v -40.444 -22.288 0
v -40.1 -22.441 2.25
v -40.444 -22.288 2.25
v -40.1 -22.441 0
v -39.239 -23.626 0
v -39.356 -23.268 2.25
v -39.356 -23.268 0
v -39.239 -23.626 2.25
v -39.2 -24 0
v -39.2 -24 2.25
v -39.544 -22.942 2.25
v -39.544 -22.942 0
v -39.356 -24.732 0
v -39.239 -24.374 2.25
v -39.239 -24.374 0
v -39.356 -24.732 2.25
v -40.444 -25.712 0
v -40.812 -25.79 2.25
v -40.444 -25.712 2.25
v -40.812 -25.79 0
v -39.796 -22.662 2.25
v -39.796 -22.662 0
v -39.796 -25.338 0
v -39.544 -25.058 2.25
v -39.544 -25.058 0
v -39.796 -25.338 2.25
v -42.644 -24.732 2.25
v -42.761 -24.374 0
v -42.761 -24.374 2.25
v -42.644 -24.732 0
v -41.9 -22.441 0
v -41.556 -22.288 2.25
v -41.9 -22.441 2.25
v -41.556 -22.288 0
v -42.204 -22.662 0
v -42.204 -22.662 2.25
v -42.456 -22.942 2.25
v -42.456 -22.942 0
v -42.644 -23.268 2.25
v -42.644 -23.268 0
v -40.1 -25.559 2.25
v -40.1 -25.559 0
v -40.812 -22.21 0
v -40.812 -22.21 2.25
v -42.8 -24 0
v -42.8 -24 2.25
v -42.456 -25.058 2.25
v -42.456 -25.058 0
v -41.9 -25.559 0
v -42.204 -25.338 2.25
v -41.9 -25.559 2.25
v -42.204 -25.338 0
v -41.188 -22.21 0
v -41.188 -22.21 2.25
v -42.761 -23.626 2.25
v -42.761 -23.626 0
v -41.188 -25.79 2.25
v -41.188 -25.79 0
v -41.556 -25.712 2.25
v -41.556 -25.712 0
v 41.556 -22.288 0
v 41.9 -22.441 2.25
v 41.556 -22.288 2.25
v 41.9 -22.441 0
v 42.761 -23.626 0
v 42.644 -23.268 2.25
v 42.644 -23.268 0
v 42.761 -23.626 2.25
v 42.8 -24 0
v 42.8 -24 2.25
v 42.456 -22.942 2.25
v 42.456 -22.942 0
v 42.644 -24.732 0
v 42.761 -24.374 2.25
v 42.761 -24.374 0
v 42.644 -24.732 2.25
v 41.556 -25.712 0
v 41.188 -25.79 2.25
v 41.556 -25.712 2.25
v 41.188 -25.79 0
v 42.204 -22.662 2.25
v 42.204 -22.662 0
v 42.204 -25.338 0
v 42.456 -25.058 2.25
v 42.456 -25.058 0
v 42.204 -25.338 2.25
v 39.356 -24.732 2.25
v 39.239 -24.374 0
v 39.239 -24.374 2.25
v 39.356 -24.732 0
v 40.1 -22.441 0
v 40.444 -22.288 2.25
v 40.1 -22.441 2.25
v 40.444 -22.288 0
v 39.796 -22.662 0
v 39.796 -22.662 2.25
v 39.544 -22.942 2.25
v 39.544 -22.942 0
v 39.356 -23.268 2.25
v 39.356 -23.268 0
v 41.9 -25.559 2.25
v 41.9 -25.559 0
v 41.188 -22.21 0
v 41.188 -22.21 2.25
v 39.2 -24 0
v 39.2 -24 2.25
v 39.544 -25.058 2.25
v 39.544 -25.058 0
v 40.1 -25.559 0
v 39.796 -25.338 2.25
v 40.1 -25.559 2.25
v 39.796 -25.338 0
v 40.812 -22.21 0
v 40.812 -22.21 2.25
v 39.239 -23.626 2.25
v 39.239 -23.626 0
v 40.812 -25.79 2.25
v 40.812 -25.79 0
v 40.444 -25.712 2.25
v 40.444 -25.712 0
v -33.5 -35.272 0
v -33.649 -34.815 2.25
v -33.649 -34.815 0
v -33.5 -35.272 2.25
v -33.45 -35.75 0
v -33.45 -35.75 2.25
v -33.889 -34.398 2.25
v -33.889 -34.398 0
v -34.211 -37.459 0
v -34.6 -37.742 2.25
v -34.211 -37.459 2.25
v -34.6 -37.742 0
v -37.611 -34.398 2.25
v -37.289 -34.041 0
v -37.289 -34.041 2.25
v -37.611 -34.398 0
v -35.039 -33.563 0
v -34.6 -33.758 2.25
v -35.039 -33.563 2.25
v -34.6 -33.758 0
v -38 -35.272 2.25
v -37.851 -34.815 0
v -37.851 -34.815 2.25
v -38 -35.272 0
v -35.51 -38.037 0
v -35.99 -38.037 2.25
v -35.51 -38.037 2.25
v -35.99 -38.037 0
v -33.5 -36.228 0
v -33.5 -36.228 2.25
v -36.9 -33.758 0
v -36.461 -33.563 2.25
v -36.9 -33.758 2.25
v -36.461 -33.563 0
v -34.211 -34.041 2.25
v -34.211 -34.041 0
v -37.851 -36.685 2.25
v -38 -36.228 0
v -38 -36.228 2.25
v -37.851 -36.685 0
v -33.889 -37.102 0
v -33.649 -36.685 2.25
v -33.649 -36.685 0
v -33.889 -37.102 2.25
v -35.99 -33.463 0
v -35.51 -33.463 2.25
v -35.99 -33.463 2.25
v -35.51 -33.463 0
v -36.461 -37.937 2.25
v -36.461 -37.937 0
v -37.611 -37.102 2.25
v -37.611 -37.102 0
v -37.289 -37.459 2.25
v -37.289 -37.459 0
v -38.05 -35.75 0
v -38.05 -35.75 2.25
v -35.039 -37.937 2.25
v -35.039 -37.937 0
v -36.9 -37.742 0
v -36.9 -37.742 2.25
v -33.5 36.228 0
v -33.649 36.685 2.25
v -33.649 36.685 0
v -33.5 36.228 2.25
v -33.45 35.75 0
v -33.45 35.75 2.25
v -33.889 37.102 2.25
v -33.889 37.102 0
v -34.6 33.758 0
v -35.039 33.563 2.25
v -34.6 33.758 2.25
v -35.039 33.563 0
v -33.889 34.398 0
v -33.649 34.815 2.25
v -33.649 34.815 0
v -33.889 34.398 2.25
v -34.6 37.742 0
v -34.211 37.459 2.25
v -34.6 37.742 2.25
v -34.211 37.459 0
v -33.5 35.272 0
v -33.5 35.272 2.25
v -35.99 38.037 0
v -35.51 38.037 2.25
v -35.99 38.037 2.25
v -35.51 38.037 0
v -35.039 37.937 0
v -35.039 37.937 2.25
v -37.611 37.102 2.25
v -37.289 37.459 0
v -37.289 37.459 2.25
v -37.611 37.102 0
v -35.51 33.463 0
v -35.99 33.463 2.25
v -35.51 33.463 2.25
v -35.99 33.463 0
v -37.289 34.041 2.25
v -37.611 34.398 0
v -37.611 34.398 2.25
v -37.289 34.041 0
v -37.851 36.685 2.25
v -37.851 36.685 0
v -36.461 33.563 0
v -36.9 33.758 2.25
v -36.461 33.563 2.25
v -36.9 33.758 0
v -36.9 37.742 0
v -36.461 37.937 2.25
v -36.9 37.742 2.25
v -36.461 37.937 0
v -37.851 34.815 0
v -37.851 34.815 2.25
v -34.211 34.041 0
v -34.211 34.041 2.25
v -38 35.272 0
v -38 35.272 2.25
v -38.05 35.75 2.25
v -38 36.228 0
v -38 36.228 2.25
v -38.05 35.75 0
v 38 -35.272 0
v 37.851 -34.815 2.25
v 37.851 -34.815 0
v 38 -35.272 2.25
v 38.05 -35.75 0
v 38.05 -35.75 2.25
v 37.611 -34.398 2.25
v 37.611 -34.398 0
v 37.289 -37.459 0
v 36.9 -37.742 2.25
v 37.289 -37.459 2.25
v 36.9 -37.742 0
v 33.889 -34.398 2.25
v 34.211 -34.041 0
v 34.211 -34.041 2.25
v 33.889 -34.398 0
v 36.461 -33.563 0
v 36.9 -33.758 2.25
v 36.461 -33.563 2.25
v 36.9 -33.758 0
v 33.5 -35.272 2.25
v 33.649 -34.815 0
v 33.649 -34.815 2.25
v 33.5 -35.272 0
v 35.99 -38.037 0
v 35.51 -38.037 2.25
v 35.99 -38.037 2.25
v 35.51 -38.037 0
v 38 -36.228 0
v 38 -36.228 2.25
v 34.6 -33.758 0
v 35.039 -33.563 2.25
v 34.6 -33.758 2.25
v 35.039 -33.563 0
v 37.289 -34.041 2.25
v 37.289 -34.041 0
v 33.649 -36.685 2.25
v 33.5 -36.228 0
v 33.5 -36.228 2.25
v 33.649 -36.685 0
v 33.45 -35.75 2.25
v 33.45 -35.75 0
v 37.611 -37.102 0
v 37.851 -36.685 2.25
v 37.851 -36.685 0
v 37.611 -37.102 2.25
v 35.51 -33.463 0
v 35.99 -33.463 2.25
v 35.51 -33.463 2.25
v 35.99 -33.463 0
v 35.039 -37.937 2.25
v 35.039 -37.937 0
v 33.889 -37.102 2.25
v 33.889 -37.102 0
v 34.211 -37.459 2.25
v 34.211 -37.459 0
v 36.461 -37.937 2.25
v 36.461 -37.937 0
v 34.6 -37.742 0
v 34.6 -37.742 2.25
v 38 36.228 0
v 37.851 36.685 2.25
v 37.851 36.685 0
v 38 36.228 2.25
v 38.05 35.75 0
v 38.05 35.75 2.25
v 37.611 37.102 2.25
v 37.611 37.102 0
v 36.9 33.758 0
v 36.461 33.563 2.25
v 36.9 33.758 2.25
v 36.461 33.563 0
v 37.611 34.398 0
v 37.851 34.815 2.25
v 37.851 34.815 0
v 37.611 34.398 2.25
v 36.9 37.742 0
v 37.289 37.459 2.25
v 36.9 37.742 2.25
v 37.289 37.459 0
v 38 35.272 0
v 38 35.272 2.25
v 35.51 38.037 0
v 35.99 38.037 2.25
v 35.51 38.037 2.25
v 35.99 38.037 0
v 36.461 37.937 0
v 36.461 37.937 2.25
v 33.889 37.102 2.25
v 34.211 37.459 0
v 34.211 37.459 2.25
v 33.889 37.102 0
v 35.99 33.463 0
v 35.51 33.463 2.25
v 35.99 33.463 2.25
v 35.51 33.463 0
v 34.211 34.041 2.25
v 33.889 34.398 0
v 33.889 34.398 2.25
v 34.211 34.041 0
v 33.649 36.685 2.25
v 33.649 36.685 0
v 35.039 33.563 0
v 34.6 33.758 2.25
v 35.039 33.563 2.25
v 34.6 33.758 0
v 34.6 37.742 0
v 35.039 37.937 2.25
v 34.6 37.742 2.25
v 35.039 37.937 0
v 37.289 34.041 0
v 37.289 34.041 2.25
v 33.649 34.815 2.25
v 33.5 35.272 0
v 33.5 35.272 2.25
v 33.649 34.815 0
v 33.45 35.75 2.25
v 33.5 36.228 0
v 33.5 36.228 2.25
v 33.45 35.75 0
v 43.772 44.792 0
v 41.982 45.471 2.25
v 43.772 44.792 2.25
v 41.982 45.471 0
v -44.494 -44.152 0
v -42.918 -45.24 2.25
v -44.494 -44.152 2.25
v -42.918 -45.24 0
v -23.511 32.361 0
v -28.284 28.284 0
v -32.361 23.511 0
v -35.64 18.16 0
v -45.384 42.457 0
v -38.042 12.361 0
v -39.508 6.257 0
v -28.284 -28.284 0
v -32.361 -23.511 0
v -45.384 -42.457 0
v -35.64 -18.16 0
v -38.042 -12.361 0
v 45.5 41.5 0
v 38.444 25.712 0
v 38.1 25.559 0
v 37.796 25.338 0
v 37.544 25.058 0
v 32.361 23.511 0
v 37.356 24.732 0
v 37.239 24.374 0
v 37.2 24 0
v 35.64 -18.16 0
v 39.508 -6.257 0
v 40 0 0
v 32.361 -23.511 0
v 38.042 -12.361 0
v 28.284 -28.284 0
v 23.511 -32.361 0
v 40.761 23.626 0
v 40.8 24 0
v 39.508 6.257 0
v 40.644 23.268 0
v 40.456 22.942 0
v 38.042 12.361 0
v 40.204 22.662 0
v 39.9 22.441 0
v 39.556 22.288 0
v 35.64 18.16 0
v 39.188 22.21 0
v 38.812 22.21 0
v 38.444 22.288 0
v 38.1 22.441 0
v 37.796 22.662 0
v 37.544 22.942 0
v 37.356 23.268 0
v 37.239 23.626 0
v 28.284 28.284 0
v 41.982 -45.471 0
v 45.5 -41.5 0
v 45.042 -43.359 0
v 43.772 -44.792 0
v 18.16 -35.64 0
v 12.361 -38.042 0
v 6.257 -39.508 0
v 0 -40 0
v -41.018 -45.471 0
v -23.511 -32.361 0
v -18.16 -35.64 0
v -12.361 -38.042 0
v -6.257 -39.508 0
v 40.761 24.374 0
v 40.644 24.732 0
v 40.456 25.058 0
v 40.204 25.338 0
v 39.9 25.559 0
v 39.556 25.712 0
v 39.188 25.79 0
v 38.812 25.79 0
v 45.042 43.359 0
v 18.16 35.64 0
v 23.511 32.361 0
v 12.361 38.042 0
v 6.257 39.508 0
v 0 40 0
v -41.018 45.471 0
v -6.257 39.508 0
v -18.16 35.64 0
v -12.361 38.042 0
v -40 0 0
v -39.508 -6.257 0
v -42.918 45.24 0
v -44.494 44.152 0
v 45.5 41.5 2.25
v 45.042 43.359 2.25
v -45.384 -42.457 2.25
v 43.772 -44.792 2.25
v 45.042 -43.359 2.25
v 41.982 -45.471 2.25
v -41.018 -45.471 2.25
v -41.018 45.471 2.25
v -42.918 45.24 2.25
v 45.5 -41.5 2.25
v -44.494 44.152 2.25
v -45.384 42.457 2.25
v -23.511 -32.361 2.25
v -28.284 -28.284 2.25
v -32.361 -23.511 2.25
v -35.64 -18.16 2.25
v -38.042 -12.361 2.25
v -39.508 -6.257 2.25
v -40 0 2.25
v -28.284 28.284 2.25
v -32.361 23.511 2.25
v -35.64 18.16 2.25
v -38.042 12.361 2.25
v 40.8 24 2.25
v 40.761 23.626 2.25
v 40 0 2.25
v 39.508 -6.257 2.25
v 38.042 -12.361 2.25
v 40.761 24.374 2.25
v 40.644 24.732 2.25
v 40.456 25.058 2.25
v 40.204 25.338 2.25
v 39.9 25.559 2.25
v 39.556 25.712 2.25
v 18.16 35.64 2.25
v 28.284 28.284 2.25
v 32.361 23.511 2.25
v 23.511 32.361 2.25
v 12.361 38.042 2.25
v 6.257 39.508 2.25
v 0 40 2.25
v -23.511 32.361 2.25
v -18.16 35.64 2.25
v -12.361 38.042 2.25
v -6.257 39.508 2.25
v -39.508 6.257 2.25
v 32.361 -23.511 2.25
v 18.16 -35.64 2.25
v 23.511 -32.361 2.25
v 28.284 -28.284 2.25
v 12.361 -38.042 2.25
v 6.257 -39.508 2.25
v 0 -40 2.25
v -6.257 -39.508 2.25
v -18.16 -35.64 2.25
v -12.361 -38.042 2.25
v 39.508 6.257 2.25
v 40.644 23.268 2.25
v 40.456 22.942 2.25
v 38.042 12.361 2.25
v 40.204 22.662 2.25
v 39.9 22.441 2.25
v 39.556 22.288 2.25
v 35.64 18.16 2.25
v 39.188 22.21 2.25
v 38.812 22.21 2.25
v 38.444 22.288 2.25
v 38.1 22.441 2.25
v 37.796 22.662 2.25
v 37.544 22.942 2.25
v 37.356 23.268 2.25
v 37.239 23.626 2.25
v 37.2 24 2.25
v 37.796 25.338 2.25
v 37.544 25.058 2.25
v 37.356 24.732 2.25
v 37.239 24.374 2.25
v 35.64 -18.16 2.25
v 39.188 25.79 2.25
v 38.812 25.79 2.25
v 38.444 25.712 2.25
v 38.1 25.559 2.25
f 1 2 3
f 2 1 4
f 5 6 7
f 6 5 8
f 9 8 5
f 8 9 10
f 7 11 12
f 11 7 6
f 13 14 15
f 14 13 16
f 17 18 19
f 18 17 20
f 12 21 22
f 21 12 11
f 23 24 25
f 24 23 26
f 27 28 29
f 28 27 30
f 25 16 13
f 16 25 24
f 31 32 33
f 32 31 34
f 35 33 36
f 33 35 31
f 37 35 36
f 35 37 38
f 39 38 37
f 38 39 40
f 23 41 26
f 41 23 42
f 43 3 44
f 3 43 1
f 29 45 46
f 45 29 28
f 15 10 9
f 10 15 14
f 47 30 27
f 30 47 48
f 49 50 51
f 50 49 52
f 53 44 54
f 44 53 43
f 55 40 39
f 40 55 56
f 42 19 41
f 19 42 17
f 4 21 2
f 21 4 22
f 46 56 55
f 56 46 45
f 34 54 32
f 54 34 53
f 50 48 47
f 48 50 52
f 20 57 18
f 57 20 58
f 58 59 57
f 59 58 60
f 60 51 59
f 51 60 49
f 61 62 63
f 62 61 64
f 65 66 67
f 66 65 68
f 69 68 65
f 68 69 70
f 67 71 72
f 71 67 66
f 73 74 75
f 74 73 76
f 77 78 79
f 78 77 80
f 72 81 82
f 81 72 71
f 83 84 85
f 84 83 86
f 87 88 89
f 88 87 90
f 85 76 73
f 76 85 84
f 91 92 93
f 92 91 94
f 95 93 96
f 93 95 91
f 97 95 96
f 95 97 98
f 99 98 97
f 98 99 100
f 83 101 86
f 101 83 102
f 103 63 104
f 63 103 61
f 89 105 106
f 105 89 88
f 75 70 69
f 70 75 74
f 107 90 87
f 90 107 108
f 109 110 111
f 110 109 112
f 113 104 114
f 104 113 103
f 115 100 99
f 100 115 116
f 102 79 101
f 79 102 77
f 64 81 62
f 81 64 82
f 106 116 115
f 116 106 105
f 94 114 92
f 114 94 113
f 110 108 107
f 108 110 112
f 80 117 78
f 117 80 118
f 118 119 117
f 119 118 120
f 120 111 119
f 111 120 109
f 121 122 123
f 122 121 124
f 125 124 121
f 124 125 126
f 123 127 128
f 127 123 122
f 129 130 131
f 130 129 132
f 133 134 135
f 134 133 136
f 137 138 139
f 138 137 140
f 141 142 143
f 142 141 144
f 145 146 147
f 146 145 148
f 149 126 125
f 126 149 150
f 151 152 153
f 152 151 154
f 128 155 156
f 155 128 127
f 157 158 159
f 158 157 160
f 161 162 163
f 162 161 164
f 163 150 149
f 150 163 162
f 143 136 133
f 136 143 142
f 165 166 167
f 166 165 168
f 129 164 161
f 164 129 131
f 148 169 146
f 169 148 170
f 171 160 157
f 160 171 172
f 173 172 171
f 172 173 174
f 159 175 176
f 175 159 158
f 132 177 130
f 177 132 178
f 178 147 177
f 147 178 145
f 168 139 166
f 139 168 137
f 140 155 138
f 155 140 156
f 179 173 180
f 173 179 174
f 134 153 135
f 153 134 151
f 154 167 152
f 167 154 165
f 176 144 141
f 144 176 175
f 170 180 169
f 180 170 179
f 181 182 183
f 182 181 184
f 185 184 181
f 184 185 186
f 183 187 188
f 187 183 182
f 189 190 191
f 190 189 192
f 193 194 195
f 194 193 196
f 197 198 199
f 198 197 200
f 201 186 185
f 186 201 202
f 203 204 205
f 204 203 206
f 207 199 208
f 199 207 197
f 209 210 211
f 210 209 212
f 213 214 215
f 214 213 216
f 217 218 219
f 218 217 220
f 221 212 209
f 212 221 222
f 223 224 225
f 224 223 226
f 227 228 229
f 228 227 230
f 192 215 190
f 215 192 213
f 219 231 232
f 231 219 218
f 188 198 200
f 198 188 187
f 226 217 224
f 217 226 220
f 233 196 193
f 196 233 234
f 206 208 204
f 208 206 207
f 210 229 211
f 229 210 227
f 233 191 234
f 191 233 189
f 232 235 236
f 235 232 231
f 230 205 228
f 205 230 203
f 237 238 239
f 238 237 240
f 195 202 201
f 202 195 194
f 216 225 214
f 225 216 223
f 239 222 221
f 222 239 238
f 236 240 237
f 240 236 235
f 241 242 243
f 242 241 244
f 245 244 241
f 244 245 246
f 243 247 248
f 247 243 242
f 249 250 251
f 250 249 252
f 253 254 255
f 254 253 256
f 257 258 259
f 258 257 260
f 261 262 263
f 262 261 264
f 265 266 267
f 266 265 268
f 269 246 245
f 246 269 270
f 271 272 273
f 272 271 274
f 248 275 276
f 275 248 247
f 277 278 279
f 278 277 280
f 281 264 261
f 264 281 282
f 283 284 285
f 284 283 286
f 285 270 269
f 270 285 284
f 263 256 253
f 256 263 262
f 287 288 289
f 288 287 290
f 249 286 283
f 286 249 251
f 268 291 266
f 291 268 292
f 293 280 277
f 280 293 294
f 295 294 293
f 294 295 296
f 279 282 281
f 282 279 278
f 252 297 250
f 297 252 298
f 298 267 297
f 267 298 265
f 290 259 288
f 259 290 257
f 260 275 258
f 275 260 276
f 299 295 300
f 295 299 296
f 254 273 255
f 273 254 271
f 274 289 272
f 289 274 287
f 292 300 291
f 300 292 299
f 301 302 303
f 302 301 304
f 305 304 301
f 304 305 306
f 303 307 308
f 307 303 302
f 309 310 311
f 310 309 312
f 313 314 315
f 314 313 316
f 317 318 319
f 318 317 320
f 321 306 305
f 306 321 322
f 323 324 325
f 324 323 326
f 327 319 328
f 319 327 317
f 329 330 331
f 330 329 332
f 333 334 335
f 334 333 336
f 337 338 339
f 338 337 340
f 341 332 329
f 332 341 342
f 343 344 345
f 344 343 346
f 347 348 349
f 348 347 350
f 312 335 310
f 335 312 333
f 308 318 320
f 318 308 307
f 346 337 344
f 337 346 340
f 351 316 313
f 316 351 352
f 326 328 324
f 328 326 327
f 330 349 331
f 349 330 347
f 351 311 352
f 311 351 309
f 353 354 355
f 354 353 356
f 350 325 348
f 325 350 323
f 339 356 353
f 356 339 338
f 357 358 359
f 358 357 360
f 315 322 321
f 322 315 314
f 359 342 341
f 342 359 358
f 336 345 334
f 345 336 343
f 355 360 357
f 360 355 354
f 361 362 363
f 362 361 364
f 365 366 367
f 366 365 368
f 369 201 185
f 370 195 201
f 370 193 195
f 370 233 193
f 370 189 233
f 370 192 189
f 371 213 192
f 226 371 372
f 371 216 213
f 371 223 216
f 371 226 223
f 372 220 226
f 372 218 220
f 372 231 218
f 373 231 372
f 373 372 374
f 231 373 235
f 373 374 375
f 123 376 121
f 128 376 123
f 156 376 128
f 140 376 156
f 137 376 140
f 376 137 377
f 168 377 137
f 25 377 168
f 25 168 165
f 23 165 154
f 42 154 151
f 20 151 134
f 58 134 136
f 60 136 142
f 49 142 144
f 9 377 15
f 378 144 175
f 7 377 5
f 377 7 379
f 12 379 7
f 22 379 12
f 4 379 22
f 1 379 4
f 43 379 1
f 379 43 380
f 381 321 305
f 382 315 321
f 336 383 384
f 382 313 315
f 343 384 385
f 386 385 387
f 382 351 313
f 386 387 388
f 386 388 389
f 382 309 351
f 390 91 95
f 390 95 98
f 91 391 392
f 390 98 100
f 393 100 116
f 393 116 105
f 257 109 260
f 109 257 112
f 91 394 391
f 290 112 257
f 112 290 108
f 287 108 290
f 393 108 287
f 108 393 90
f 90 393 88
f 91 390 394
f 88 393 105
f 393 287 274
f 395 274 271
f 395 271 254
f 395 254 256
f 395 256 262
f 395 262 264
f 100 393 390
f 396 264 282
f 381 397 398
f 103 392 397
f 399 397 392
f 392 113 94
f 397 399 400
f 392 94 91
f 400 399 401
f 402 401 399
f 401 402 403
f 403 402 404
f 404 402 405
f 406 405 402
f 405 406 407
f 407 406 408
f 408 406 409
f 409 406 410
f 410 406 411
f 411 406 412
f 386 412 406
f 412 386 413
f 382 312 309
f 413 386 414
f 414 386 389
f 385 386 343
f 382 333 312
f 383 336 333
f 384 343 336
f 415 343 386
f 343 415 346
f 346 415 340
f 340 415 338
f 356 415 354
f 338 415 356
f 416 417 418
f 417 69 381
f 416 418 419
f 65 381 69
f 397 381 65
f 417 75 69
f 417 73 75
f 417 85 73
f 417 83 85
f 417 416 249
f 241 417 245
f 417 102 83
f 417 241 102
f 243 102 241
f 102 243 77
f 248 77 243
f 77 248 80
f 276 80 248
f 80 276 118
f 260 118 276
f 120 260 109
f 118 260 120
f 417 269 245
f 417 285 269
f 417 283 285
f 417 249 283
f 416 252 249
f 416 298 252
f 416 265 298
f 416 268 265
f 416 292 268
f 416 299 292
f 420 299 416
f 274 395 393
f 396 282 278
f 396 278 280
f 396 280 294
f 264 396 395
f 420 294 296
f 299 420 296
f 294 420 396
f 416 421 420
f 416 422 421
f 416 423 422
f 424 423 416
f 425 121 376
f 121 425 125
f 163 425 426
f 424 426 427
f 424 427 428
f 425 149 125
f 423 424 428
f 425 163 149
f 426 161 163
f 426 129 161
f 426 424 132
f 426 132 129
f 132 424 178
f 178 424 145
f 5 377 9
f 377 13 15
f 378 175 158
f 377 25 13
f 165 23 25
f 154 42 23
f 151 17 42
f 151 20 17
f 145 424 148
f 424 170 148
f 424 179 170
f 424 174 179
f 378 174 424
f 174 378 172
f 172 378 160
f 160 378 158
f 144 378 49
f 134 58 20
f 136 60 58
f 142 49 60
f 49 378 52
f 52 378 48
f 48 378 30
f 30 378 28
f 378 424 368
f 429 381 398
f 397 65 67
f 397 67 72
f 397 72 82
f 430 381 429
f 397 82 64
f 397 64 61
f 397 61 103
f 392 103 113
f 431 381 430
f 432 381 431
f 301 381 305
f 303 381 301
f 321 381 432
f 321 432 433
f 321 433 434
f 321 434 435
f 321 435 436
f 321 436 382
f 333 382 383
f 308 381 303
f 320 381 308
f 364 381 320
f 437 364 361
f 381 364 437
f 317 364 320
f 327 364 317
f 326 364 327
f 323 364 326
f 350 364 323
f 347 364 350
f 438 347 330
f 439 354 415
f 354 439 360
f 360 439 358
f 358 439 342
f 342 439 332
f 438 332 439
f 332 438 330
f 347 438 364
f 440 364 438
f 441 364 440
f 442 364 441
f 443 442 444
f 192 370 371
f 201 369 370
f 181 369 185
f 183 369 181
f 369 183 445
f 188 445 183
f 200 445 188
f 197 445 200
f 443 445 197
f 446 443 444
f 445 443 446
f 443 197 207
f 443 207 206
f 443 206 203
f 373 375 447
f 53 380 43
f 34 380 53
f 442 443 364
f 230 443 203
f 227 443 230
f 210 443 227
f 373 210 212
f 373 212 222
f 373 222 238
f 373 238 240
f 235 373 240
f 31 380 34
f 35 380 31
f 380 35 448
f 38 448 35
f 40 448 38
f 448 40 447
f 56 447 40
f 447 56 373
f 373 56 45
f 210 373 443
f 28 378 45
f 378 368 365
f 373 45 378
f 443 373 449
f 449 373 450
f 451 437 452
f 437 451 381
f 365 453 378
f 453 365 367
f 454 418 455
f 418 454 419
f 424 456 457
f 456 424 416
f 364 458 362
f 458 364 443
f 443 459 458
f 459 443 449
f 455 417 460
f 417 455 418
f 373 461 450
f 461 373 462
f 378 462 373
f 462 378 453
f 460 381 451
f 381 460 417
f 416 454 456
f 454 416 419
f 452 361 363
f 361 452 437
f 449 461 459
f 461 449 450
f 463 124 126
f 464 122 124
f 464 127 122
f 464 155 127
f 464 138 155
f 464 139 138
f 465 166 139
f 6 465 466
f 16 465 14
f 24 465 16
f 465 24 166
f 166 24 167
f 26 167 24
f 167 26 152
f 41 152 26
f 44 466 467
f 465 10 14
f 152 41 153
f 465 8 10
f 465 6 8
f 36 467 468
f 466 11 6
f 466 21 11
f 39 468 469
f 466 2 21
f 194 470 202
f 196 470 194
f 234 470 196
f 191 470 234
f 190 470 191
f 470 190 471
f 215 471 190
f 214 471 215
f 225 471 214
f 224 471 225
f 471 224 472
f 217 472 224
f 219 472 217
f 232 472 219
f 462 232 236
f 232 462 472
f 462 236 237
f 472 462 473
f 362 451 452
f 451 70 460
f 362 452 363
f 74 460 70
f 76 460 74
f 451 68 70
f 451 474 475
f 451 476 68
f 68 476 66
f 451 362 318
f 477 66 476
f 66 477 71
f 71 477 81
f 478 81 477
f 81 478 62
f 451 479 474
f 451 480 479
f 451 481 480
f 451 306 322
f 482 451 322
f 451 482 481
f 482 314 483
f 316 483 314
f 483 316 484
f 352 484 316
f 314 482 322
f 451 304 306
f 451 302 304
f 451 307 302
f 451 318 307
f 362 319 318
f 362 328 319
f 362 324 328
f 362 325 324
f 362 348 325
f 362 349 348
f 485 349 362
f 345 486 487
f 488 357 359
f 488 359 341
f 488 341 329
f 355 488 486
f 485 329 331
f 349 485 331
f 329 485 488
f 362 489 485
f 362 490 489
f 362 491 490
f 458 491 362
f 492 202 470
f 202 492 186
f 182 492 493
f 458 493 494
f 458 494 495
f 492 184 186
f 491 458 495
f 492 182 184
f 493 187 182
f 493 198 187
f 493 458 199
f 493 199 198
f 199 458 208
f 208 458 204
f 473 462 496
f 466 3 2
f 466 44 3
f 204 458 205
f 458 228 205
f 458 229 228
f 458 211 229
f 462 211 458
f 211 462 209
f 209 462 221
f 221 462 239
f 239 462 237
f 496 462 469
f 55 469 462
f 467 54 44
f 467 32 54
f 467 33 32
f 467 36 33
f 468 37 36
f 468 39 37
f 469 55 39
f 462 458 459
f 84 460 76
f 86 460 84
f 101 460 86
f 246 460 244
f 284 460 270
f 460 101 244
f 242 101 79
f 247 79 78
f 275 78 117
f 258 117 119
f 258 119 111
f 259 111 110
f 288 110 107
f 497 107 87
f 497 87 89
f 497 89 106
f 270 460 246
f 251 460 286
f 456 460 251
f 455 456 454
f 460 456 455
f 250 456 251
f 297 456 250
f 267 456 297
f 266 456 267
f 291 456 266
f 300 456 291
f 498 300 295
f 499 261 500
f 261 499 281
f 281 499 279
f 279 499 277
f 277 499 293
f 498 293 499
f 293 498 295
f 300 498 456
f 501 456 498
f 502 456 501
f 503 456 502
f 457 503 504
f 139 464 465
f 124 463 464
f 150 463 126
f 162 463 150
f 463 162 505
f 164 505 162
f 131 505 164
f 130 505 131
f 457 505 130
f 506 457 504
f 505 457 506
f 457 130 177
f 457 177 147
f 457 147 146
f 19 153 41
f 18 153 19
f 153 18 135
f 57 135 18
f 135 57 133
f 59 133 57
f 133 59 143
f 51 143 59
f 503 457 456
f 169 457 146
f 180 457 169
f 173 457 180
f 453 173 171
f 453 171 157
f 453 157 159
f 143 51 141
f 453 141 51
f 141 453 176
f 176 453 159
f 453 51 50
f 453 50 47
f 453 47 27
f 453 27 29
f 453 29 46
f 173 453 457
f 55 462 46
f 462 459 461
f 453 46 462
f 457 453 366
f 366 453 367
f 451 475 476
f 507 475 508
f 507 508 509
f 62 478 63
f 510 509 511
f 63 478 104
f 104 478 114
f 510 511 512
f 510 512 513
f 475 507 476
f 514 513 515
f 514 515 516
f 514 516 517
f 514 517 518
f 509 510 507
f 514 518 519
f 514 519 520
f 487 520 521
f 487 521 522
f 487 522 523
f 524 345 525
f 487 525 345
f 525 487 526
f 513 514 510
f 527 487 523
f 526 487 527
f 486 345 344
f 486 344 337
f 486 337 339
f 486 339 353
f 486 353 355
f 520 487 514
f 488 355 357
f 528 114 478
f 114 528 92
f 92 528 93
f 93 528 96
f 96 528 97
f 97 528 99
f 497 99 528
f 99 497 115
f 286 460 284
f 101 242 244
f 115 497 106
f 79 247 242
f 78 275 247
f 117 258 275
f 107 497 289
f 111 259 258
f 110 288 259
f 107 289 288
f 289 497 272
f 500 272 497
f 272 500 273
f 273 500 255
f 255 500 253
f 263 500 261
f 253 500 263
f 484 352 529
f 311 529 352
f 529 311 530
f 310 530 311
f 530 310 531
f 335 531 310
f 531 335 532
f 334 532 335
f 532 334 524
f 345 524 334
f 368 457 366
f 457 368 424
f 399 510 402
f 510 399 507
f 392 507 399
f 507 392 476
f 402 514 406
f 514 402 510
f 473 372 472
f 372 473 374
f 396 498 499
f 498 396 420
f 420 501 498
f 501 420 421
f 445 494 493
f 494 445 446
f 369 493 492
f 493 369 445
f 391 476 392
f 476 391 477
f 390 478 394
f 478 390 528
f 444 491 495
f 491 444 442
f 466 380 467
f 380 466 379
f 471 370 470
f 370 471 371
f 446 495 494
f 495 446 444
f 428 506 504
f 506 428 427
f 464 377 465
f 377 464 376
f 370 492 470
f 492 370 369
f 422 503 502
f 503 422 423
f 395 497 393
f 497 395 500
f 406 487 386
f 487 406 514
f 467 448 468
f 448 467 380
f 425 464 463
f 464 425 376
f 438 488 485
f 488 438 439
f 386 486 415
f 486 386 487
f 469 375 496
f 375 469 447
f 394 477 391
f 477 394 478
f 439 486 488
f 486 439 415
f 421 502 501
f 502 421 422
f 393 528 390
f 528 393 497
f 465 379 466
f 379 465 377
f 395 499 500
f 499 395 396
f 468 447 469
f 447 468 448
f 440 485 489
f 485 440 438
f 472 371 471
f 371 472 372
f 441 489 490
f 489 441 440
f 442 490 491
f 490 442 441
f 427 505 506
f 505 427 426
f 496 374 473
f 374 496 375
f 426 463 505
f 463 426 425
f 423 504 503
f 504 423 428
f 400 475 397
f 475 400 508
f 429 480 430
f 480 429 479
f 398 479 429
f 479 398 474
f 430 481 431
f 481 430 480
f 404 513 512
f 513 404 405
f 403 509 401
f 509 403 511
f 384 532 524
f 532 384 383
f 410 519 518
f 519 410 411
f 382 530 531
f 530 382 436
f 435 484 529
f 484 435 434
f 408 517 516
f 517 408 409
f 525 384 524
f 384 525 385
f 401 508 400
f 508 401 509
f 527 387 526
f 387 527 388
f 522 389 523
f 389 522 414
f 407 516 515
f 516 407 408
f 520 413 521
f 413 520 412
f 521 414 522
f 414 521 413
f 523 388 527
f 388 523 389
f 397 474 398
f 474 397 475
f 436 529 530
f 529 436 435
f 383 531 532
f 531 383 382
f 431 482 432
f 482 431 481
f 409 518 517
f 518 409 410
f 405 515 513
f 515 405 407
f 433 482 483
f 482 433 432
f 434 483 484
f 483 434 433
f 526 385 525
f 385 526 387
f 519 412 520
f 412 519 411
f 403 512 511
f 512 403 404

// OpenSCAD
// file: dronePlates.scad
/**
 * dronePlates.scad
 * Plate library
 *
 * GNU GPL V3
 * @author: Victor Potenciano
 */

m3Rad = 3.4/2;
cornerR = 4;

/**
 *
 */
module helperDisk(diameter) {
	cylinder(r = diameter/2, h = 0.6, $fn=20);
}

/**
 *
 */
module roundedRect(size, radius) {
	x = size[0];
	y = size[1];
	z = size[2];

	linear_extrude(height=z)
	hull() {
	// place 4 circles in the corners, with the given radius
	translate([(-x/2)+(radius/2), (-y/2)+(radius/2), 0]){ circle(r=radius); }
	translate([(x/2)-(radius/2), (-y/2)+(radius/2), 0]){ circle(r=radius); }
	translate([(-x/2)+(radius/2), (y/2)-(radius/2), 0]){ circle(r=radius); }
	translate([(x/2)-(radius/2), (y/2)-(radius/2), 0]){ circle(r=radius); }
	}
}

/**
 * rounded rectangle triangle with corner at origin
 */
module roundedTriangle(size, radius) {
	x = size[0];
	y = size[1];
	z = size[2];

	linear_extrude(height=z)
	hull() {
	translate([radius, radius, 0]){ circle(r=radius); }
	translate([x-radius, radius, 0]){ circle(r=radius); }
	translate([radius, y-radius, 0]){ circle(r=radius); }
	}
}

/**
 *
 */
module roundRectPlate(w, l, plateThick=3) {
	difference(){
		roundedRect([l+m3Rad*1.75,w+m3Rad*1.75,plateThick], cornerR);
		translate([l/2, w/2, -0.5]) { cylinder(h = plateThick+1, r = m3Rad, $fn=30); }
		translate([-l/2, w/2, -0.5]) { cylinder(h = plateThick+1, r = m3Rad, $fn=30); }
		translate([l/2, -w/2, -0.5]) { cylinder(h = plateThick+1, r = m3Rad, $fn=30); }
		translate([-l/2, -w/2, -0.5]) { cylinder(h = plateThick+1, r = m3Rad, $fn=30); }
	}
}

/**
 *
 */
module crossSquarePlate(l, thick=3) {
	inDist = cornerR*2+4;
	trianL = sqrt((l*l)/2)-inDist;
	centerR = 4;

	difference(){
		roundRectPlate(l, l, thick);
		translate([0, centerR, -0.5]) { 
			rotate([0,0,45]){ roundedTriangle([trianL,trianL,thick+1], cornerR-2); }
		}
		translate([0, -centerR, -0.5]) { 
			rotate([0,0,225]){ roundedTriangle([trianL,trianL,thick+1], cornerR-2); }
		}
		translate([-centerR, 0, -0.5]) { 
			rotate([0,0,135]){ roundedTriangle([trianL,trianL,thick+1], cornerR-2); }
		}
		translate([centerR, 0, -0.5]) { 
			rotate([0,0,-45]){ roundedTriangle([trianL,trianL,thick+1], cornerR-2); }
		}
	}
}

/**
 *
 */
module hShapePlate(w, l, thick=4) {
	inDist = cornerR*2+1;

	difference(){
		roundRectPlate(w, l, thick);
		translate([0, w/4, -0.5]) { roundedRect([l-inDist,w/2-inDist,thick+1], cornerR-2); }
		translate([0, -w/4, -0.5]) { roundedRect([l-inDist,w/2-inDist,thick+1], cornerR-2); }
	}
}

/**
 *
 */
module motorCircleMount(inDia, outDia, thick=3, extraH=false, d1=19, d2=16, holeR=m3Rad ) {
	difference(){
		cylinder(h = thick, r = outDia/2, $fn=30);
		motorCircleMountHoles(inDia, outDia, thick, extraH, d1=d1, d2=d2, holeR=holeR);
	}
}

/**
 *
 */
module motorCircleMountHoles(inDia, outDia, thick=3, extraH=false, d1=19, d2=16, d3=25, holeR=m3Rad) {
	translate([0, 0, -0.5]) { cylinder(h = thick+1, r = inDia/2, $fn=30); }

	for(i=[0:3]) {
		rotate([0,0,90*i]){
		translate([d1/2, 0, -0.5]) cylinder(h = thick+1, r = holeR, $fn=20);
		translate([d2/2, 0, -0.5]) cylinder(h = thick+1, r = holeR, $fn=20);
		translate([d2/2, -holeR, -0.5]) cube(size = [(d1-d2)/2,holeR*2,thick+1]);
		}
	}
	
	if(extraH==true){	
		for(i=[-1,1]) translate([i*d3/2, 0, -0.5]) { cylinder(h = thick+1, r = holeR, $fn=30); }
	}
}

/**
 *
 */
module motorRectMount(w, l, inDia, thick=3) {
	d1=19;
	d2=16;

	difference(){
		roundRectPlate(w, l, thick);
		translate([0, 0, -0.5]) { cylinder(h = thick+1, r = inDia/2, $fn=30); }
		translate([0, d1/2, -0.5]) { cylinder(h = thick+1, r = m3Rad, $fn=30); }
		translate([0, -d1/2, -0.5]) { cylinder(h = thick+1, r = m3Rad, $fn=30); }
		translate([d2/2, 0, -0.5]) { cylinder(h = thick+1, r = m3Rad, $fn=30); }
		translate([-d2/2, 0, -0.5]) { cylinder(h = thick+1, r = m3Rad, $fn=30); }
	}
}

/**
 *
 */
module tube(inDia, outDia, height) {
	difference(){
		cylinder(h = height, r = outDia/2, $fn=50);
		translate([0, 0, -0.5]) { cylinder(h = height+1, r = inDia/2, $fn=30); }
	}
}

/**
 *
 */
module squareTube(inDia, outDia, height) {
	translate([0,0,height/2]){
	difference(){
		cube(size = [outDia,outDia,height], center = true);
		cube(size = [inDia,inDia,height+1], center = true);
	}
	}
}

/**
 *
 */
module djiFlamewheelHoles(height) {
	a = 23;
	b = 16;
	c = 19.5;
	
	translate([a/2, c/2, 0]) { cylinder(h = height, r = m3Rad, $fn=30); }
	translate([-a/2, c/2, 0]) { cylinder(h = height, r = m3Rad, $fn=30); }
	translate([b/2, -c/2, 0]) { cylinder(h = height, r = m3Rad, $fn=30); }
	translate([-b/2, -c/2, 0]) { cylinder(h = height, r = m3Rad, $fn=30); }
}

/**
 *
 */
module djiFlamewheelHolesBotton(height) {
	a1 = 21;
	c = 19.5;
	
	translate([a1/2, c/2, 0]) { cylinder(h = height, r = m3Rad, $fn=30); }
	translate([-a1/2, c/2, 0]) { cylinder(h = height, r = m3Rad, $fn=30); }
}

/**
 *
 */
module propeller(size){
union(){
difference(){
	cylinder(h = 3, r = size/2, center=true, $fn=30);
	cylinder(h = 3.1, r = size/2-2, center=true, $fn=30); 
}
for( i = [-1,1] ){
rotate([0,0,45*i]){ cube(size = [size,4,1], center = true); }
}
}
}

/**
 *
 */
module slot(length, height, rad){
for(i=[-1,1]) translate([i*length/2,0,0]) cylinder(h = height, r = rad, $fn=30);
translate([0,0,height/2]) cube(size = [length,rad*2,height], center = true);
}

 

////////////////////////
// Examples:
////////////////////////

motorCircleMount(8, 25, 3.5);

//roundedRect([50,50,3], 4);

//hShapePlate(79, 25);

//rotate([0,0,45]){roundedTriangle([40,40,3], 4);}

//crossSquarePlate(45, 4);

/*
union(){
motorRectMount(21, 18, 8, 4);
translate([9, 10.5, 0]) {tube(m3Rad*2, 6.5, 6);}
}
*/

/*
difference(){
union(){
hShapePlate(50, 30, 3.5);
translate([-4,-25,0]){cube(size = [8,50,3.5]);}
rotate([0, 0, 45]) {motorCircleMount(8, 35, 3.5);}
}
cylinder(h = 10, r = 4, $fn=100, center=true);
}
*/

//rotate([90,0,0]){ tube(5,10,20); }
//translate([20,0,0]){ squareTube(5, 10, 20); }
// main file
/**
 * ramps fan plate
 */

use <dronePlates.scad>

m3Rad = 3.6/2;
m4Rad = 4.6/2;
fanHoles = 71.5;
plateThick = 2.25;

difference(){

union(){
roundedRect([87,87,plateThick],4);
}//union

translate([0,0,-0.5]) cylinder(h = plateThick+1, r = 80/2, $fn=40);

translate([82/2-2,48/2,-0.5]) cylinder(h = plateThick+1, r = m3Rad, $fn=30);

for(i=[-1,1]) translate([i*82/2,-48/2,-0.5]) cylinder(h = plateThick+1, r = m3Rad, $fn=30);

for(i=[-1,1]) for(j=[-1,1]) translate([i*fanHoles/2,j*fanHoles/2,-0.5]) cylinder(h = plateThick+1, r = m4Rad, $fn=30);
}//diff
